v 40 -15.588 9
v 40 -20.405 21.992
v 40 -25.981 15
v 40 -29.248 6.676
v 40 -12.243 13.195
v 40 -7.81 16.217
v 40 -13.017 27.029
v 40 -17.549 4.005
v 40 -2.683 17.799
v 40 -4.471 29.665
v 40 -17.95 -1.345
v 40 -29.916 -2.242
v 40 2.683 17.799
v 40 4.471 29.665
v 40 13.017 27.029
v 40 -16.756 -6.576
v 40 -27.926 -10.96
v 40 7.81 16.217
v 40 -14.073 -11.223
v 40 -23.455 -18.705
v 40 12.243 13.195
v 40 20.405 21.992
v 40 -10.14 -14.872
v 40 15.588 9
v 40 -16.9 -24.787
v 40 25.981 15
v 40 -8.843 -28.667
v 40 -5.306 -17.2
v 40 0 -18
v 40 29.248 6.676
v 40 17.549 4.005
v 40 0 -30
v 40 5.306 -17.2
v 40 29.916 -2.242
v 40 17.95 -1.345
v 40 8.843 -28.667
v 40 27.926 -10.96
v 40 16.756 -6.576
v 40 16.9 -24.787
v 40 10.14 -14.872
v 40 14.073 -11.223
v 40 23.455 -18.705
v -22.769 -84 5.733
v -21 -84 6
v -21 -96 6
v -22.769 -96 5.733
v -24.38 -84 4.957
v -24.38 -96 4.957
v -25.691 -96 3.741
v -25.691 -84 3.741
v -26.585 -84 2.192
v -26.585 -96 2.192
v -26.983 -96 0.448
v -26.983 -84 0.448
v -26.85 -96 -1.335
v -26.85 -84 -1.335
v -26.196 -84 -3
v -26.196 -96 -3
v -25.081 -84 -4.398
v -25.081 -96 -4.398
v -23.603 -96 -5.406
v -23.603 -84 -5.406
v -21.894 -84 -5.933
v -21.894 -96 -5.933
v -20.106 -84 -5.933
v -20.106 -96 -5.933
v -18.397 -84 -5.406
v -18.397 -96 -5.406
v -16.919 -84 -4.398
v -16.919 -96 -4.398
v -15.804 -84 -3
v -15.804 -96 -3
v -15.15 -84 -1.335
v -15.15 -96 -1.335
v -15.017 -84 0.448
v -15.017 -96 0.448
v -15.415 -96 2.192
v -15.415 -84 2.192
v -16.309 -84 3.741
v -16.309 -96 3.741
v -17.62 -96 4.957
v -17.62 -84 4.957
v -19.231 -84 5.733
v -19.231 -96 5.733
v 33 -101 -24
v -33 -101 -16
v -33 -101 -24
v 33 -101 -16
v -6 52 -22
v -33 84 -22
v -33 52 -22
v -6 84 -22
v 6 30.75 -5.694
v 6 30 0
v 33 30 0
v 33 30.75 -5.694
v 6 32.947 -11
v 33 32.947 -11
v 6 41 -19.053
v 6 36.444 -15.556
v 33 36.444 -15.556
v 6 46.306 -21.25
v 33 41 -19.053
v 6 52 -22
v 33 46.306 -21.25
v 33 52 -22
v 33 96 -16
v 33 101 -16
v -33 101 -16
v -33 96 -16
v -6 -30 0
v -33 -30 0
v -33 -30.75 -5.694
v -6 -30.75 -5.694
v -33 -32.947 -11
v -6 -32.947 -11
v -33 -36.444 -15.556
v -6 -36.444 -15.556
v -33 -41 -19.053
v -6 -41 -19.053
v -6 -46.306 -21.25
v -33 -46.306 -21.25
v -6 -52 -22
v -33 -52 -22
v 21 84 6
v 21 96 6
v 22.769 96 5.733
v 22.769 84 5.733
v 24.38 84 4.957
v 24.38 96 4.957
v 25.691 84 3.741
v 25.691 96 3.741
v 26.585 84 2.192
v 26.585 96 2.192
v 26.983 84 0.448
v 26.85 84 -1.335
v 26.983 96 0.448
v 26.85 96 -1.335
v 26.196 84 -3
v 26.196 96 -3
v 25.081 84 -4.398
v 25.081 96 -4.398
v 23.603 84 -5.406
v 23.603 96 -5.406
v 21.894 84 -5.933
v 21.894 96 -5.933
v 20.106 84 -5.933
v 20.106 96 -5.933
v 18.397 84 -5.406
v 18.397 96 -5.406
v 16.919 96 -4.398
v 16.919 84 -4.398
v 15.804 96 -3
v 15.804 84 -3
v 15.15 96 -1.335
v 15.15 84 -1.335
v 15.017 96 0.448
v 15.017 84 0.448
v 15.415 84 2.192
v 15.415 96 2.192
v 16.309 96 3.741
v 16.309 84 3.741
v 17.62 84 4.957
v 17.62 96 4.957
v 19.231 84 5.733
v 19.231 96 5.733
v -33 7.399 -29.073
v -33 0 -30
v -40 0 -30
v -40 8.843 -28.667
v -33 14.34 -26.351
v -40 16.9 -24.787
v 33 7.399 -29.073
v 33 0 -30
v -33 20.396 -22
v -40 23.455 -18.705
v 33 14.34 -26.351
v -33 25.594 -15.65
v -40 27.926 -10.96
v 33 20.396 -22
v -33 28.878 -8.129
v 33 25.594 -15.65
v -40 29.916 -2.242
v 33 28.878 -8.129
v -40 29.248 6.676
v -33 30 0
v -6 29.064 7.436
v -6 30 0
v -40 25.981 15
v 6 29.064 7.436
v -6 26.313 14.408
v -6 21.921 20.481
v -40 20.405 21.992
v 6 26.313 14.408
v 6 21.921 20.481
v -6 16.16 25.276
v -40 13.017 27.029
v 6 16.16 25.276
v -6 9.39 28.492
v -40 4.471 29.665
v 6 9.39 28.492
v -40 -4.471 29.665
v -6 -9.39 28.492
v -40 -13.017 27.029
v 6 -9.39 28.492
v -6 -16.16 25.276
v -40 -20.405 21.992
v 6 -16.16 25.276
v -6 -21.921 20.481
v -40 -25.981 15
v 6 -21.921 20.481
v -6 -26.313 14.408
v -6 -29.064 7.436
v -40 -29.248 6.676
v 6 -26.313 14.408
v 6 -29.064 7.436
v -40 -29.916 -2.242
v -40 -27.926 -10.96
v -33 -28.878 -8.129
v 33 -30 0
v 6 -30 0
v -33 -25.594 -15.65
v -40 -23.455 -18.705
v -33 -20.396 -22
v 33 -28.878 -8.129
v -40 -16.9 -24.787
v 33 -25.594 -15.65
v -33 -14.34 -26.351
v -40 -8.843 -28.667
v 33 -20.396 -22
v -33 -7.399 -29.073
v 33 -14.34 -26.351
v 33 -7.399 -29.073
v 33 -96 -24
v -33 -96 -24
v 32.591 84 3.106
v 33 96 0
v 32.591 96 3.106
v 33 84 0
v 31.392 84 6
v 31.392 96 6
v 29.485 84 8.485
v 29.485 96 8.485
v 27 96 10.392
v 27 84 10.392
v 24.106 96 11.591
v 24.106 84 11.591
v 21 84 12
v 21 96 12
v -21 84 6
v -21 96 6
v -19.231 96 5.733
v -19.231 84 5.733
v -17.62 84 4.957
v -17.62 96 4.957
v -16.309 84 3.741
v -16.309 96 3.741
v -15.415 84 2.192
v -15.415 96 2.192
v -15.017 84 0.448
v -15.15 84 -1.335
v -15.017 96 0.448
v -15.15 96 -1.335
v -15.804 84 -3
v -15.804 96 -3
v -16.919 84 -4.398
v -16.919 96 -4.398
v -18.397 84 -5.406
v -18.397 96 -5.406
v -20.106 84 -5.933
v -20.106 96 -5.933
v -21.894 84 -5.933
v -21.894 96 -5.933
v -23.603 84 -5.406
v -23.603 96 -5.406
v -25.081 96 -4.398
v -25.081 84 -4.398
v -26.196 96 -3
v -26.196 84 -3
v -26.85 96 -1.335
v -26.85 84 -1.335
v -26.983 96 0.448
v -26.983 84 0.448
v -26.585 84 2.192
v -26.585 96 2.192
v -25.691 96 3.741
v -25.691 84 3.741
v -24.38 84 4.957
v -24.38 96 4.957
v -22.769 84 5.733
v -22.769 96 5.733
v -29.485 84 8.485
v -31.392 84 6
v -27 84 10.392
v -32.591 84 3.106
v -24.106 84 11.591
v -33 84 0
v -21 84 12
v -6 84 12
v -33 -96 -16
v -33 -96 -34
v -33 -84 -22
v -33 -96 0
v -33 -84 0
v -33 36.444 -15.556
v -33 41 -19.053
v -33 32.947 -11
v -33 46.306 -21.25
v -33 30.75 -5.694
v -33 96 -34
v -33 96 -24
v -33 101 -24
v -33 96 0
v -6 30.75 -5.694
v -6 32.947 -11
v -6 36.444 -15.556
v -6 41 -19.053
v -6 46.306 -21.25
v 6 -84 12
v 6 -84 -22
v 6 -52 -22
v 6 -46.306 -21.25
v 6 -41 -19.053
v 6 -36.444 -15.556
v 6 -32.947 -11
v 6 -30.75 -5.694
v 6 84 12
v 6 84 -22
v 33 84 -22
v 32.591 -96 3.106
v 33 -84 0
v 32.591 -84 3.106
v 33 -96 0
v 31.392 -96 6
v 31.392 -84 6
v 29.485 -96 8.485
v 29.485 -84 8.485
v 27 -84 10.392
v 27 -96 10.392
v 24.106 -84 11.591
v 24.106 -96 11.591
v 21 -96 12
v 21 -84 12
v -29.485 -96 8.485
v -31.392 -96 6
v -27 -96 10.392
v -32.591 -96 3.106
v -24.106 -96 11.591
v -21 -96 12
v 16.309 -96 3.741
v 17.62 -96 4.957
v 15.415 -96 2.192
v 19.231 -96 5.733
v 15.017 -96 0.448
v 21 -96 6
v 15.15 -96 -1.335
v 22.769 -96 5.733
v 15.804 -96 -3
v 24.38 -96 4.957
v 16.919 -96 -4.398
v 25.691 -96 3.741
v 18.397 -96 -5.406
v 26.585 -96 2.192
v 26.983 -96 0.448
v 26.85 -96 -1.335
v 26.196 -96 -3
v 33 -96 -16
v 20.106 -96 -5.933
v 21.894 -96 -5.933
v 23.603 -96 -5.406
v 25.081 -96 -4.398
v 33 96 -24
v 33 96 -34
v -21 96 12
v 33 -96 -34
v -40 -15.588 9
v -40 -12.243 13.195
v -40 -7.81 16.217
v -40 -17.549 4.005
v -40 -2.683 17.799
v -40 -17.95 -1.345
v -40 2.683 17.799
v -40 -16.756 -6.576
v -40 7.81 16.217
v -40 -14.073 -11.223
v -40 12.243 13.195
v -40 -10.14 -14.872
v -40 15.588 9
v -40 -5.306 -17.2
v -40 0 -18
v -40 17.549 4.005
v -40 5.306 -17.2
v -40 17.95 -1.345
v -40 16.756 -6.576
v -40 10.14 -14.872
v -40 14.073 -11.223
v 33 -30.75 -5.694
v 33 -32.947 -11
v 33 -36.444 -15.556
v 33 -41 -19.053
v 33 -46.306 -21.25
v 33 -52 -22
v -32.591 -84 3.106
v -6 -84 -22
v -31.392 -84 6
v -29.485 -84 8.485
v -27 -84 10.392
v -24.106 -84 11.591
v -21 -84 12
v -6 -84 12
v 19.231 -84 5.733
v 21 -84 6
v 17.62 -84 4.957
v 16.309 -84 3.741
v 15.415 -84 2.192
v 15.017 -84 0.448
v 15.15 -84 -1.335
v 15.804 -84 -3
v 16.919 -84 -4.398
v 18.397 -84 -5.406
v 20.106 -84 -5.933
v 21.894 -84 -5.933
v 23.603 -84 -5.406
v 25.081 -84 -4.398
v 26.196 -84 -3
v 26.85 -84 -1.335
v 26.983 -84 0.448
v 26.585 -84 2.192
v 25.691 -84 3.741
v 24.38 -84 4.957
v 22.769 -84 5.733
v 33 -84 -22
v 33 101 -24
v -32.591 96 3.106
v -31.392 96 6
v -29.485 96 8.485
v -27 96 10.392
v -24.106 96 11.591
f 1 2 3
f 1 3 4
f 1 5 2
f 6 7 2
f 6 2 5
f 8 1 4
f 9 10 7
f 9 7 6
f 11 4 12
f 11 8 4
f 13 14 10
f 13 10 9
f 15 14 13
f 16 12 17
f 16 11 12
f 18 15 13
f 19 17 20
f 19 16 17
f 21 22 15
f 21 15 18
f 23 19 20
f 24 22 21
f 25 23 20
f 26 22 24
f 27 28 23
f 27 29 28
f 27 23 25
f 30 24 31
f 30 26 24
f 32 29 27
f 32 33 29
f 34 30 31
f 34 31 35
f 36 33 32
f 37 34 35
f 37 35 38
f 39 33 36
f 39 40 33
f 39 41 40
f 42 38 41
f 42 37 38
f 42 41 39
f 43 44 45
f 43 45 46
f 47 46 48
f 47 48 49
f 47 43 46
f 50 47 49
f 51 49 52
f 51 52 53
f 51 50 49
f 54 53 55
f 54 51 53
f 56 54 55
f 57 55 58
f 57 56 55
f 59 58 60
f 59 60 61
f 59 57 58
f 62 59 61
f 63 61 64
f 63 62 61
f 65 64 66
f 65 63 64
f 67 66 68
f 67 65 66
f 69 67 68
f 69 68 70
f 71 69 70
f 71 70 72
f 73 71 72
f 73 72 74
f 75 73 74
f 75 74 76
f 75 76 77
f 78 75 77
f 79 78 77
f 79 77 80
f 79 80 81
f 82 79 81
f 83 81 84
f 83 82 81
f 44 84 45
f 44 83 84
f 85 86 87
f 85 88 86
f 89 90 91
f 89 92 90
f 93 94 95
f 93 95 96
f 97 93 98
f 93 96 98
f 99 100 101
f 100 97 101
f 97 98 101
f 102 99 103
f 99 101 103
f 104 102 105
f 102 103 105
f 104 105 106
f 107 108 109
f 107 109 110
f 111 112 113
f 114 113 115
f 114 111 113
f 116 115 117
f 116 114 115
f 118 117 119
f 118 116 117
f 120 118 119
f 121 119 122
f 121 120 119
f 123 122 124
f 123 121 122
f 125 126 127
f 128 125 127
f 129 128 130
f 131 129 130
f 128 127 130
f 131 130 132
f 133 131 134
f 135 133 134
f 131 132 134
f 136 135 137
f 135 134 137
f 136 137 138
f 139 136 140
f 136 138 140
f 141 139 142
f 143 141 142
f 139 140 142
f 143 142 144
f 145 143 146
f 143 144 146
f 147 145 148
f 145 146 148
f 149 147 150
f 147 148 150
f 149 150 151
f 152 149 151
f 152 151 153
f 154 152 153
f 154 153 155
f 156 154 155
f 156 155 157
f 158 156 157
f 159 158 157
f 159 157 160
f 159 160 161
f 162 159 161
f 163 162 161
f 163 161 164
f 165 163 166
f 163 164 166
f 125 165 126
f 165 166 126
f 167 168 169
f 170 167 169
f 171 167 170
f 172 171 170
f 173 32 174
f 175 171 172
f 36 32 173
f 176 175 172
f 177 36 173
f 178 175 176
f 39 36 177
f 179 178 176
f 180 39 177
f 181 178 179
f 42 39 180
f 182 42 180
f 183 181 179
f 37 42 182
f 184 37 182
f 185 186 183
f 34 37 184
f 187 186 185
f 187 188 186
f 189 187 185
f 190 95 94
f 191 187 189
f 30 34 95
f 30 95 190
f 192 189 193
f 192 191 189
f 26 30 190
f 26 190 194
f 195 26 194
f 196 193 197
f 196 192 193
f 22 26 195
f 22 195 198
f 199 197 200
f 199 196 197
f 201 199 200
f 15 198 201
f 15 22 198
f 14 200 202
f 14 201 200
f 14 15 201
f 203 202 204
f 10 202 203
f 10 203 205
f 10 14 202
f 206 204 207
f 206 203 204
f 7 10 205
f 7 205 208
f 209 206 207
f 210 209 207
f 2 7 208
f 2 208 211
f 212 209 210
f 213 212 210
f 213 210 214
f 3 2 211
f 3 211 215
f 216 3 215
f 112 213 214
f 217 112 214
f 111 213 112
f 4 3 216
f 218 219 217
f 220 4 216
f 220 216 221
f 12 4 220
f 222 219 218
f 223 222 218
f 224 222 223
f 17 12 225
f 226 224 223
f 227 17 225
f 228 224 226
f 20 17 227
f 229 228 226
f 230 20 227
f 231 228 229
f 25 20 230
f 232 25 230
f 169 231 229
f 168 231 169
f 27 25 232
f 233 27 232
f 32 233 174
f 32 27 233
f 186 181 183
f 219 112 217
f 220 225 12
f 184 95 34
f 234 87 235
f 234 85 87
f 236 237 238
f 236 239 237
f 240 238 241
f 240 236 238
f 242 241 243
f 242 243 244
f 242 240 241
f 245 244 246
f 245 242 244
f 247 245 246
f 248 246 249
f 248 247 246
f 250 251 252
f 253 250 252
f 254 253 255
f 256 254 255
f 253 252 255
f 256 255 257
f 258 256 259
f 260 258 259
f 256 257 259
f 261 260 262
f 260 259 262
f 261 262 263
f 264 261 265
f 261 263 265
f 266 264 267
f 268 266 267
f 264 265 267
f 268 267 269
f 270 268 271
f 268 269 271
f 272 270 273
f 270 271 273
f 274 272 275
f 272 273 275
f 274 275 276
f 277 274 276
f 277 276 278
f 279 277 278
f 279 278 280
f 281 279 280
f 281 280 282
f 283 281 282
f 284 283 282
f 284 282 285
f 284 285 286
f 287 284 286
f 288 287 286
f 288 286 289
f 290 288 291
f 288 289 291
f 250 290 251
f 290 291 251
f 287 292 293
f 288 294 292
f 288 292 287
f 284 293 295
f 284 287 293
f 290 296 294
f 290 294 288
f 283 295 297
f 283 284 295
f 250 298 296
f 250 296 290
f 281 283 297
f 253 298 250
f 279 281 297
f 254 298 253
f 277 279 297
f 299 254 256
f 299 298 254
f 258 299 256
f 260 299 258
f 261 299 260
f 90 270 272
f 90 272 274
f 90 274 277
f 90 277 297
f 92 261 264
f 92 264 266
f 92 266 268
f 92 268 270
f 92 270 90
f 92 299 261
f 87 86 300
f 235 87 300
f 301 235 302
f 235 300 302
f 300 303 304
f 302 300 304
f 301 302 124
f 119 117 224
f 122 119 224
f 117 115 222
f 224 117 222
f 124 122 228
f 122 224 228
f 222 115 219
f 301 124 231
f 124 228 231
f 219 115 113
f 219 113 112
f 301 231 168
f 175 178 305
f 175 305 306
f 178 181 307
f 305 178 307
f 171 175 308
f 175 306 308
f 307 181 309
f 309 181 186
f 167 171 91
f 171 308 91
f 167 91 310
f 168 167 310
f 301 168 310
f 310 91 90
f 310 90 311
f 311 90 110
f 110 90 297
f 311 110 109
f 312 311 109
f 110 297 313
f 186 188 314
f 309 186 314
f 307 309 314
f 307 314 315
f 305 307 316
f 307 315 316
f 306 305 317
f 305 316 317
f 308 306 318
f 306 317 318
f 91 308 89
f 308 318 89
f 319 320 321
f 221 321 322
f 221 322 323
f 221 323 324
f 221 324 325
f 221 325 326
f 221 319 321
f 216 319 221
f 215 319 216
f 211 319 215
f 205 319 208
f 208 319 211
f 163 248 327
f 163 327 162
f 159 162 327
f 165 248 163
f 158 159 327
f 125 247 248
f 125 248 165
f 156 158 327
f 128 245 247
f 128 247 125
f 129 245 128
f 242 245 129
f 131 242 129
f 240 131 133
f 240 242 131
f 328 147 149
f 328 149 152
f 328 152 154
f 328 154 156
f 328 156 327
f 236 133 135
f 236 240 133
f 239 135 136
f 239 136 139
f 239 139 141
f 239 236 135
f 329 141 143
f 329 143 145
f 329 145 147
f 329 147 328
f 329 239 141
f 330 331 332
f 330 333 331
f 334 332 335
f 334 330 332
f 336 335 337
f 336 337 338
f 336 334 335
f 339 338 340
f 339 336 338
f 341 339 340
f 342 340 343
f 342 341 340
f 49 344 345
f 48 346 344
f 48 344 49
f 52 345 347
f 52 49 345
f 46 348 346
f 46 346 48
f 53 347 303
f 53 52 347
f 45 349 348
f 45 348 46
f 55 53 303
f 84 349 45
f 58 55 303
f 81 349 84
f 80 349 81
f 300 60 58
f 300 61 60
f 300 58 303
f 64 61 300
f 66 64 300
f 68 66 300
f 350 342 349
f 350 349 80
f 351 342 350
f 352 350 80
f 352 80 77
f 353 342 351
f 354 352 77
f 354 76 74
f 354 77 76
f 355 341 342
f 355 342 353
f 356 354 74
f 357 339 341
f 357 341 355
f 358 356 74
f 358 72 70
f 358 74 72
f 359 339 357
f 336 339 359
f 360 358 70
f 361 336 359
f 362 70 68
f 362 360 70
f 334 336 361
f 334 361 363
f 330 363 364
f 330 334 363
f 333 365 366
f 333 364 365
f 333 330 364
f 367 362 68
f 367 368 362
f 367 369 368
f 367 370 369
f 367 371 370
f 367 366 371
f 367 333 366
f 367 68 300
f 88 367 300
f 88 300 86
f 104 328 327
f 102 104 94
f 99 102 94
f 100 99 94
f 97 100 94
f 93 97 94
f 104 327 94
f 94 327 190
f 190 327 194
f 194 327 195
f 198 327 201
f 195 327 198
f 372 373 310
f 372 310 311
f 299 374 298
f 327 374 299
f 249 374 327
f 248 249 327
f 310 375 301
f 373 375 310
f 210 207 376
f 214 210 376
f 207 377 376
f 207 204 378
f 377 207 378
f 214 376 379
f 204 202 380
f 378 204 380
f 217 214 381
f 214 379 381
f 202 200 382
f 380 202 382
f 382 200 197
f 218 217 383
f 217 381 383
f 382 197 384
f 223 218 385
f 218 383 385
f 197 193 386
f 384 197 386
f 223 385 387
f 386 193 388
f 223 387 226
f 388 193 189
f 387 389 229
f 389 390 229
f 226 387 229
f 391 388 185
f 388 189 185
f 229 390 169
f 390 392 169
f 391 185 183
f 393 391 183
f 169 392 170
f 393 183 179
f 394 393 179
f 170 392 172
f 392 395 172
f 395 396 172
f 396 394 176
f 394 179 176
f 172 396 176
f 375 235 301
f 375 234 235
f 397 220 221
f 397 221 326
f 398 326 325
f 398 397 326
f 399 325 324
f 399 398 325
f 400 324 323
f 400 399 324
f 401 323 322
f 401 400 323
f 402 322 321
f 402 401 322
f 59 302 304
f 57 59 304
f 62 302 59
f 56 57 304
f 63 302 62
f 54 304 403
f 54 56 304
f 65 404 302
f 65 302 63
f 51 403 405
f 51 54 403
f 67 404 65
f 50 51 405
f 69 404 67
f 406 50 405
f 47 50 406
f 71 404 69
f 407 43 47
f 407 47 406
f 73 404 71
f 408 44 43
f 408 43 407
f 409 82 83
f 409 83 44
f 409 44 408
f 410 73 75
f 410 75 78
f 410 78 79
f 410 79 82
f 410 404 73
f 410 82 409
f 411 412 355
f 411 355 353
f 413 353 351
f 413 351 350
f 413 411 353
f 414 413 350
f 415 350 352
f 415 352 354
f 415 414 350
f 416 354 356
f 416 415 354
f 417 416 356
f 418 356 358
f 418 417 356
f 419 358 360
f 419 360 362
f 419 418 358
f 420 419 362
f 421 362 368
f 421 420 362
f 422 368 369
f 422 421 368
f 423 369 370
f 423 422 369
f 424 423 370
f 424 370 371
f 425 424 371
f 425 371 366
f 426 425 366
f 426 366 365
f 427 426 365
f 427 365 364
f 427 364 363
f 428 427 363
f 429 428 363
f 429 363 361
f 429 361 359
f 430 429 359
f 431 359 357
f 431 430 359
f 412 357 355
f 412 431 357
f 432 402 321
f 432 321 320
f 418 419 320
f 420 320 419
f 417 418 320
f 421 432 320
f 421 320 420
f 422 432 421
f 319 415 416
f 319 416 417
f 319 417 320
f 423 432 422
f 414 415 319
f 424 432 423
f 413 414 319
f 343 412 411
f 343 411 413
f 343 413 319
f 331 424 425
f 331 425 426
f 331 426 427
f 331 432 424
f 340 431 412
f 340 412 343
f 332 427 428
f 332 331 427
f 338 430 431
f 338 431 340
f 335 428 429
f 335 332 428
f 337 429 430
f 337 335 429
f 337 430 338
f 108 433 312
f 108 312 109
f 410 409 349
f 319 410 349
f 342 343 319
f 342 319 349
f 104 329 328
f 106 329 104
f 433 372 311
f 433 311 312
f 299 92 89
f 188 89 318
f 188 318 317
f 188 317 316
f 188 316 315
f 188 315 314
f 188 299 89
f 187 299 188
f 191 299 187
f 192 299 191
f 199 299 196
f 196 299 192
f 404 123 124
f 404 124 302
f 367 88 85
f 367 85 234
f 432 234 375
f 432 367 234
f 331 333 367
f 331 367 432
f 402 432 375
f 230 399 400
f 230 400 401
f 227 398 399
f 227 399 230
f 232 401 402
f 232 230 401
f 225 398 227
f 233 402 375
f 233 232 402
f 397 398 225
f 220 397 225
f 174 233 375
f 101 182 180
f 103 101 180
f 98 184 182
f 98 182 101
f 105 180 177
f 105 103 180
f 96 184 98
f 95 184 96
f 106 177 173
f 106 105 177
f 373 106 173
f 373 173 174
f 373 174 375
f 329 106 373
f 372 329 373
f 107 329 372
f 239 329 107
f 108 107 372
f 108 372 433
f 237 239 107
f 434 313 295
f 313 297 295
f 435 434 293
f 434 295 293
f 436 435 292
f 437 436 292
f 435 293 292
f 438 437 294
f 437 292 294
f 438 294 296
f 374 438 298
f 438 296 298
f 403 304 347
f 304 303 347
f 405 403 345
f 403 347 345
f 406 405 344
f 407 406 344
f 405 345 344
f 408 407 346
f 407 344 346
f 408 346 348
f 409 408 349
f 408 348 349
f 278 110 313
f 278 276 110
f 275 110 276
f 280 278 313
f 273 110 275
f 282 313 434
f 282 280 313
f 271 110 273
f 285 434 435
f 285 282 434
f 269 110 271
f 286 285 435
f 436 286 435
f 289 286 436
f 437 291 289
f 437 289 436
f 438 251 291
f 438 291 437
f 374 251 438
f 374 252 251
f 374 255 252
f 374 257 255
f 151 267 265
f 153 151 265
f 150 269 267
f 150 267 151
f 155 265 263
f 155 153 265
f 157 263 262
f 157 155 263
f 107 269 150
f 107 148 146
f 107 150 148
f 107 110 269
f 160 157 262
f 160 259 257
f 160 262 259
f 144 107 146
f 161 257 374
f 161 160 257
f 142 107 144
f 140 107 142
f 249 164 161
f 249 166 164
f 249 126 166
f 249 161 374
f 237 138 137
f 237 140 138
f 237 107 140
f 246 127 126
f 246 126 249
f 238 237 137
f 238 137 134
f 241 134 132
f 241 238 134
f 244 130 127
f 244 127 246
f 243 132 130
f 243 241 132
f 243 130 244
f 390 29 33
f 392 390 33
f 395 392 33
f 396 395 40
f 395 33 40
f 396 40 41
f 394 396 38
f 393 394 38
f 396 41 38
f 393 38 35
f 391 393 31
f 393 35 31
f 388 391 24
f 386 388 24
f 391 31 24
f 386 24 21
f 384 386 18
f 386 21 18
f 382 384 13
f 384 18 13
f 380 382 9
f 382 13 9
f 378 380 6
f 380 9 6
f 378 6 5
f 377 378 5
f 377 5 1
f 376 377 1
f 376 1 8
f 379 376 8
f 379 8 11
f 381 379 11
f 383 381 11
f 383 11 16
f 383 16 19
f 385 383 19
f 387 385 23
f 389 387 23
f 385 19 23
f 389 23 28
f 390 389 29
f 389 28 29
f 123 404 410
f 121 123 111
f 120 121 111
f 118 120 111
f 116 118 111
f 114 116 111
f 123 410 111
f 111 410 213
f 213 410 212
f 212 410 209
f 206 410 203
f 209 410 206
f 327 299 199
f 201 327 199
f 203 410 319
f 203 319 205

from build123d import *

# Parameters (mm, degrees)
BOSS_EXTRUDE1_DEPTH = 33
SKETCH1_3_R         = 30
BOSS_EXTRUDE2_DEPTH = 40
FILLET1_R           = 22
RIB1_REACH          = 115.829
SKETCH2_WALL_W      = 306.068234896
SKETCH2_WALL_H      = 12
FILLET2_R           = 12
SKETCH3_R           = 6
CUT_EXTRUDE1_DEPTH  = 12
CUT_EXTRUDE2_START  = -12
SKETCH4_R           = 6
CUT_EXTRUDE2_DEPTH  = 12
SKETCH5_R           = 18
CUT_EXTRUDE3_DEPTH  = 80


with BuildPart() as part:
    # Sketch1 → Boss-Extrude1 (new, symmetric)
    with BuildSketch(Plane.YZ):
        with BuildLine():
            Line((-96, -24), (-96, -34))
            Line((-96, -34), (96, -34))
            Line((96, -34), (96, -24))
            Line((96, -24), (101, -24))
            Line((101, -24), (101, -16))
            Line((101, -16), (96, -16))
            Line((96, -16), (96, 12))
            Line((96, 12), (84, 12))
            Line((84, 12), (84, -22))
            Line((84, -22), (20.396078054, -22))
            ThreePointArc((20.396078054, -22), (0, -30), (-20.396078054, -22))
            Line((-20.396078054, -22), (-84, -22))
            Line((-84, -22), (-84, 12))
            Line((-84, 12), (-96, 12))
            Line((-96, 12), (-96, -16))
            Line((-96, -16), (-101, -16))
            Line((-101, -16), (-101, -24))
            Line((-101, -24), (-96, -24))
        make_face()
    extrude(amount=BOSS_EXTRUDE1_DEPTH, both=True)

    # Sketch1<3> → Boss-Extrude2 (add, symmetric)
    with BuildSketch(Plane.YZ):
        with Locations(Location((0, 0, 0), (0, 0, 270))):
            Circle(SKETCH1_3_R)
    extrude(amount=BOSS_EXTRUDE2_DEPTH, both=True)

    # Fillet1
    fillet1_edges = [part.edges().sort_by_distance(p)[0] for p in [
        (0, 20.396078054, -22),
        (0, -20.396078054, -22),
    ]]
    fillet(fillet1_edges, radius=FILLET1_R)

    # Sketch2 wall → Rib1 (add, up to next)
    with BuildSketch(Plane(origin=(0, -46.695244813, 20.246216205), x_dir=(0, 0.97642883454, 0.215839595718), z_dir=(0, -0.215839595718, 0.97642883454)), mode=Mode.PRIVATE) as rib1_sk1:
        Rectangle(SKETCH2_WALL_W, SKETCH2_WALL_H)
    rib1_tool1 = extrude(rib1_sk1.sketch, amount=-RIB1_REACH, mode=Mode.PRIVATE) - part.part
    rib1 = rib1_tool1.solids().sort_by_distance((0, -46.695244813, 20.246216205))[0]
    add(rib1)

    # Mirror1: Rib1 across plane
    add(rib1.mirror(Plane.ZX))

    # Fillet2
    fillet2_edges = [part.edges().sort_by_distance(p)[0] for p in [
        (-33, 90, 12),
        (33, -90, 12),
        (-33, -90, 12),
        (33, 90, 12),
    ]]
    fillet(fillet2_edges, radius=FILLET2_R)

    # Sketch3 → Cut-Extrude1 (cut)
    with BuildSketch(Plane(origin=(0, 96, 0), x_dir=(-1, 0, 0), z_dir=(0, 1, 0))):
        with Locations(Location((-21, 0, 0), (0, 0, 90))):
            Circle(SKETCH3_R)
        with Locations(Location((21, 0, 0), (0, 0, 90))):
            Circle(SKETCH3_R)
    extrude(amount=-CUT_EXTRUDE1_DEPTH, mode=Mode.SUBTRACT)

    # Sketch4 → Cut-Extrude2 (cut)
    with BuildSketch(Plane.XZ.offset(96).offset(CUT_EXTRUDE2_START)):
        with Locations(Location((-21, 0, 0), (0, 0, 90))):
            Circle(SKETCH4_R)
        with Locations(Location((21, 0, 0), (0, 0, 90))):
            Circle(SKETCH4_R)
    extrude(amount=CUT_EXTRUDE2_DEPTH, mode=Mode.SUBTRACT)

    # Sketch5 → Cut-Extrude3 (cut)
    with BuildSketch(Plane.YZ.offset(40)):
        with Locations(Location((0, 0, 0), (0, 0, 270))):
            Circle(SKETCH5_R)
    extrude(amount=-CUT_EXTRUDE3_DEPTH, mode=Mode.SUBTRACT)


solid = part.part
